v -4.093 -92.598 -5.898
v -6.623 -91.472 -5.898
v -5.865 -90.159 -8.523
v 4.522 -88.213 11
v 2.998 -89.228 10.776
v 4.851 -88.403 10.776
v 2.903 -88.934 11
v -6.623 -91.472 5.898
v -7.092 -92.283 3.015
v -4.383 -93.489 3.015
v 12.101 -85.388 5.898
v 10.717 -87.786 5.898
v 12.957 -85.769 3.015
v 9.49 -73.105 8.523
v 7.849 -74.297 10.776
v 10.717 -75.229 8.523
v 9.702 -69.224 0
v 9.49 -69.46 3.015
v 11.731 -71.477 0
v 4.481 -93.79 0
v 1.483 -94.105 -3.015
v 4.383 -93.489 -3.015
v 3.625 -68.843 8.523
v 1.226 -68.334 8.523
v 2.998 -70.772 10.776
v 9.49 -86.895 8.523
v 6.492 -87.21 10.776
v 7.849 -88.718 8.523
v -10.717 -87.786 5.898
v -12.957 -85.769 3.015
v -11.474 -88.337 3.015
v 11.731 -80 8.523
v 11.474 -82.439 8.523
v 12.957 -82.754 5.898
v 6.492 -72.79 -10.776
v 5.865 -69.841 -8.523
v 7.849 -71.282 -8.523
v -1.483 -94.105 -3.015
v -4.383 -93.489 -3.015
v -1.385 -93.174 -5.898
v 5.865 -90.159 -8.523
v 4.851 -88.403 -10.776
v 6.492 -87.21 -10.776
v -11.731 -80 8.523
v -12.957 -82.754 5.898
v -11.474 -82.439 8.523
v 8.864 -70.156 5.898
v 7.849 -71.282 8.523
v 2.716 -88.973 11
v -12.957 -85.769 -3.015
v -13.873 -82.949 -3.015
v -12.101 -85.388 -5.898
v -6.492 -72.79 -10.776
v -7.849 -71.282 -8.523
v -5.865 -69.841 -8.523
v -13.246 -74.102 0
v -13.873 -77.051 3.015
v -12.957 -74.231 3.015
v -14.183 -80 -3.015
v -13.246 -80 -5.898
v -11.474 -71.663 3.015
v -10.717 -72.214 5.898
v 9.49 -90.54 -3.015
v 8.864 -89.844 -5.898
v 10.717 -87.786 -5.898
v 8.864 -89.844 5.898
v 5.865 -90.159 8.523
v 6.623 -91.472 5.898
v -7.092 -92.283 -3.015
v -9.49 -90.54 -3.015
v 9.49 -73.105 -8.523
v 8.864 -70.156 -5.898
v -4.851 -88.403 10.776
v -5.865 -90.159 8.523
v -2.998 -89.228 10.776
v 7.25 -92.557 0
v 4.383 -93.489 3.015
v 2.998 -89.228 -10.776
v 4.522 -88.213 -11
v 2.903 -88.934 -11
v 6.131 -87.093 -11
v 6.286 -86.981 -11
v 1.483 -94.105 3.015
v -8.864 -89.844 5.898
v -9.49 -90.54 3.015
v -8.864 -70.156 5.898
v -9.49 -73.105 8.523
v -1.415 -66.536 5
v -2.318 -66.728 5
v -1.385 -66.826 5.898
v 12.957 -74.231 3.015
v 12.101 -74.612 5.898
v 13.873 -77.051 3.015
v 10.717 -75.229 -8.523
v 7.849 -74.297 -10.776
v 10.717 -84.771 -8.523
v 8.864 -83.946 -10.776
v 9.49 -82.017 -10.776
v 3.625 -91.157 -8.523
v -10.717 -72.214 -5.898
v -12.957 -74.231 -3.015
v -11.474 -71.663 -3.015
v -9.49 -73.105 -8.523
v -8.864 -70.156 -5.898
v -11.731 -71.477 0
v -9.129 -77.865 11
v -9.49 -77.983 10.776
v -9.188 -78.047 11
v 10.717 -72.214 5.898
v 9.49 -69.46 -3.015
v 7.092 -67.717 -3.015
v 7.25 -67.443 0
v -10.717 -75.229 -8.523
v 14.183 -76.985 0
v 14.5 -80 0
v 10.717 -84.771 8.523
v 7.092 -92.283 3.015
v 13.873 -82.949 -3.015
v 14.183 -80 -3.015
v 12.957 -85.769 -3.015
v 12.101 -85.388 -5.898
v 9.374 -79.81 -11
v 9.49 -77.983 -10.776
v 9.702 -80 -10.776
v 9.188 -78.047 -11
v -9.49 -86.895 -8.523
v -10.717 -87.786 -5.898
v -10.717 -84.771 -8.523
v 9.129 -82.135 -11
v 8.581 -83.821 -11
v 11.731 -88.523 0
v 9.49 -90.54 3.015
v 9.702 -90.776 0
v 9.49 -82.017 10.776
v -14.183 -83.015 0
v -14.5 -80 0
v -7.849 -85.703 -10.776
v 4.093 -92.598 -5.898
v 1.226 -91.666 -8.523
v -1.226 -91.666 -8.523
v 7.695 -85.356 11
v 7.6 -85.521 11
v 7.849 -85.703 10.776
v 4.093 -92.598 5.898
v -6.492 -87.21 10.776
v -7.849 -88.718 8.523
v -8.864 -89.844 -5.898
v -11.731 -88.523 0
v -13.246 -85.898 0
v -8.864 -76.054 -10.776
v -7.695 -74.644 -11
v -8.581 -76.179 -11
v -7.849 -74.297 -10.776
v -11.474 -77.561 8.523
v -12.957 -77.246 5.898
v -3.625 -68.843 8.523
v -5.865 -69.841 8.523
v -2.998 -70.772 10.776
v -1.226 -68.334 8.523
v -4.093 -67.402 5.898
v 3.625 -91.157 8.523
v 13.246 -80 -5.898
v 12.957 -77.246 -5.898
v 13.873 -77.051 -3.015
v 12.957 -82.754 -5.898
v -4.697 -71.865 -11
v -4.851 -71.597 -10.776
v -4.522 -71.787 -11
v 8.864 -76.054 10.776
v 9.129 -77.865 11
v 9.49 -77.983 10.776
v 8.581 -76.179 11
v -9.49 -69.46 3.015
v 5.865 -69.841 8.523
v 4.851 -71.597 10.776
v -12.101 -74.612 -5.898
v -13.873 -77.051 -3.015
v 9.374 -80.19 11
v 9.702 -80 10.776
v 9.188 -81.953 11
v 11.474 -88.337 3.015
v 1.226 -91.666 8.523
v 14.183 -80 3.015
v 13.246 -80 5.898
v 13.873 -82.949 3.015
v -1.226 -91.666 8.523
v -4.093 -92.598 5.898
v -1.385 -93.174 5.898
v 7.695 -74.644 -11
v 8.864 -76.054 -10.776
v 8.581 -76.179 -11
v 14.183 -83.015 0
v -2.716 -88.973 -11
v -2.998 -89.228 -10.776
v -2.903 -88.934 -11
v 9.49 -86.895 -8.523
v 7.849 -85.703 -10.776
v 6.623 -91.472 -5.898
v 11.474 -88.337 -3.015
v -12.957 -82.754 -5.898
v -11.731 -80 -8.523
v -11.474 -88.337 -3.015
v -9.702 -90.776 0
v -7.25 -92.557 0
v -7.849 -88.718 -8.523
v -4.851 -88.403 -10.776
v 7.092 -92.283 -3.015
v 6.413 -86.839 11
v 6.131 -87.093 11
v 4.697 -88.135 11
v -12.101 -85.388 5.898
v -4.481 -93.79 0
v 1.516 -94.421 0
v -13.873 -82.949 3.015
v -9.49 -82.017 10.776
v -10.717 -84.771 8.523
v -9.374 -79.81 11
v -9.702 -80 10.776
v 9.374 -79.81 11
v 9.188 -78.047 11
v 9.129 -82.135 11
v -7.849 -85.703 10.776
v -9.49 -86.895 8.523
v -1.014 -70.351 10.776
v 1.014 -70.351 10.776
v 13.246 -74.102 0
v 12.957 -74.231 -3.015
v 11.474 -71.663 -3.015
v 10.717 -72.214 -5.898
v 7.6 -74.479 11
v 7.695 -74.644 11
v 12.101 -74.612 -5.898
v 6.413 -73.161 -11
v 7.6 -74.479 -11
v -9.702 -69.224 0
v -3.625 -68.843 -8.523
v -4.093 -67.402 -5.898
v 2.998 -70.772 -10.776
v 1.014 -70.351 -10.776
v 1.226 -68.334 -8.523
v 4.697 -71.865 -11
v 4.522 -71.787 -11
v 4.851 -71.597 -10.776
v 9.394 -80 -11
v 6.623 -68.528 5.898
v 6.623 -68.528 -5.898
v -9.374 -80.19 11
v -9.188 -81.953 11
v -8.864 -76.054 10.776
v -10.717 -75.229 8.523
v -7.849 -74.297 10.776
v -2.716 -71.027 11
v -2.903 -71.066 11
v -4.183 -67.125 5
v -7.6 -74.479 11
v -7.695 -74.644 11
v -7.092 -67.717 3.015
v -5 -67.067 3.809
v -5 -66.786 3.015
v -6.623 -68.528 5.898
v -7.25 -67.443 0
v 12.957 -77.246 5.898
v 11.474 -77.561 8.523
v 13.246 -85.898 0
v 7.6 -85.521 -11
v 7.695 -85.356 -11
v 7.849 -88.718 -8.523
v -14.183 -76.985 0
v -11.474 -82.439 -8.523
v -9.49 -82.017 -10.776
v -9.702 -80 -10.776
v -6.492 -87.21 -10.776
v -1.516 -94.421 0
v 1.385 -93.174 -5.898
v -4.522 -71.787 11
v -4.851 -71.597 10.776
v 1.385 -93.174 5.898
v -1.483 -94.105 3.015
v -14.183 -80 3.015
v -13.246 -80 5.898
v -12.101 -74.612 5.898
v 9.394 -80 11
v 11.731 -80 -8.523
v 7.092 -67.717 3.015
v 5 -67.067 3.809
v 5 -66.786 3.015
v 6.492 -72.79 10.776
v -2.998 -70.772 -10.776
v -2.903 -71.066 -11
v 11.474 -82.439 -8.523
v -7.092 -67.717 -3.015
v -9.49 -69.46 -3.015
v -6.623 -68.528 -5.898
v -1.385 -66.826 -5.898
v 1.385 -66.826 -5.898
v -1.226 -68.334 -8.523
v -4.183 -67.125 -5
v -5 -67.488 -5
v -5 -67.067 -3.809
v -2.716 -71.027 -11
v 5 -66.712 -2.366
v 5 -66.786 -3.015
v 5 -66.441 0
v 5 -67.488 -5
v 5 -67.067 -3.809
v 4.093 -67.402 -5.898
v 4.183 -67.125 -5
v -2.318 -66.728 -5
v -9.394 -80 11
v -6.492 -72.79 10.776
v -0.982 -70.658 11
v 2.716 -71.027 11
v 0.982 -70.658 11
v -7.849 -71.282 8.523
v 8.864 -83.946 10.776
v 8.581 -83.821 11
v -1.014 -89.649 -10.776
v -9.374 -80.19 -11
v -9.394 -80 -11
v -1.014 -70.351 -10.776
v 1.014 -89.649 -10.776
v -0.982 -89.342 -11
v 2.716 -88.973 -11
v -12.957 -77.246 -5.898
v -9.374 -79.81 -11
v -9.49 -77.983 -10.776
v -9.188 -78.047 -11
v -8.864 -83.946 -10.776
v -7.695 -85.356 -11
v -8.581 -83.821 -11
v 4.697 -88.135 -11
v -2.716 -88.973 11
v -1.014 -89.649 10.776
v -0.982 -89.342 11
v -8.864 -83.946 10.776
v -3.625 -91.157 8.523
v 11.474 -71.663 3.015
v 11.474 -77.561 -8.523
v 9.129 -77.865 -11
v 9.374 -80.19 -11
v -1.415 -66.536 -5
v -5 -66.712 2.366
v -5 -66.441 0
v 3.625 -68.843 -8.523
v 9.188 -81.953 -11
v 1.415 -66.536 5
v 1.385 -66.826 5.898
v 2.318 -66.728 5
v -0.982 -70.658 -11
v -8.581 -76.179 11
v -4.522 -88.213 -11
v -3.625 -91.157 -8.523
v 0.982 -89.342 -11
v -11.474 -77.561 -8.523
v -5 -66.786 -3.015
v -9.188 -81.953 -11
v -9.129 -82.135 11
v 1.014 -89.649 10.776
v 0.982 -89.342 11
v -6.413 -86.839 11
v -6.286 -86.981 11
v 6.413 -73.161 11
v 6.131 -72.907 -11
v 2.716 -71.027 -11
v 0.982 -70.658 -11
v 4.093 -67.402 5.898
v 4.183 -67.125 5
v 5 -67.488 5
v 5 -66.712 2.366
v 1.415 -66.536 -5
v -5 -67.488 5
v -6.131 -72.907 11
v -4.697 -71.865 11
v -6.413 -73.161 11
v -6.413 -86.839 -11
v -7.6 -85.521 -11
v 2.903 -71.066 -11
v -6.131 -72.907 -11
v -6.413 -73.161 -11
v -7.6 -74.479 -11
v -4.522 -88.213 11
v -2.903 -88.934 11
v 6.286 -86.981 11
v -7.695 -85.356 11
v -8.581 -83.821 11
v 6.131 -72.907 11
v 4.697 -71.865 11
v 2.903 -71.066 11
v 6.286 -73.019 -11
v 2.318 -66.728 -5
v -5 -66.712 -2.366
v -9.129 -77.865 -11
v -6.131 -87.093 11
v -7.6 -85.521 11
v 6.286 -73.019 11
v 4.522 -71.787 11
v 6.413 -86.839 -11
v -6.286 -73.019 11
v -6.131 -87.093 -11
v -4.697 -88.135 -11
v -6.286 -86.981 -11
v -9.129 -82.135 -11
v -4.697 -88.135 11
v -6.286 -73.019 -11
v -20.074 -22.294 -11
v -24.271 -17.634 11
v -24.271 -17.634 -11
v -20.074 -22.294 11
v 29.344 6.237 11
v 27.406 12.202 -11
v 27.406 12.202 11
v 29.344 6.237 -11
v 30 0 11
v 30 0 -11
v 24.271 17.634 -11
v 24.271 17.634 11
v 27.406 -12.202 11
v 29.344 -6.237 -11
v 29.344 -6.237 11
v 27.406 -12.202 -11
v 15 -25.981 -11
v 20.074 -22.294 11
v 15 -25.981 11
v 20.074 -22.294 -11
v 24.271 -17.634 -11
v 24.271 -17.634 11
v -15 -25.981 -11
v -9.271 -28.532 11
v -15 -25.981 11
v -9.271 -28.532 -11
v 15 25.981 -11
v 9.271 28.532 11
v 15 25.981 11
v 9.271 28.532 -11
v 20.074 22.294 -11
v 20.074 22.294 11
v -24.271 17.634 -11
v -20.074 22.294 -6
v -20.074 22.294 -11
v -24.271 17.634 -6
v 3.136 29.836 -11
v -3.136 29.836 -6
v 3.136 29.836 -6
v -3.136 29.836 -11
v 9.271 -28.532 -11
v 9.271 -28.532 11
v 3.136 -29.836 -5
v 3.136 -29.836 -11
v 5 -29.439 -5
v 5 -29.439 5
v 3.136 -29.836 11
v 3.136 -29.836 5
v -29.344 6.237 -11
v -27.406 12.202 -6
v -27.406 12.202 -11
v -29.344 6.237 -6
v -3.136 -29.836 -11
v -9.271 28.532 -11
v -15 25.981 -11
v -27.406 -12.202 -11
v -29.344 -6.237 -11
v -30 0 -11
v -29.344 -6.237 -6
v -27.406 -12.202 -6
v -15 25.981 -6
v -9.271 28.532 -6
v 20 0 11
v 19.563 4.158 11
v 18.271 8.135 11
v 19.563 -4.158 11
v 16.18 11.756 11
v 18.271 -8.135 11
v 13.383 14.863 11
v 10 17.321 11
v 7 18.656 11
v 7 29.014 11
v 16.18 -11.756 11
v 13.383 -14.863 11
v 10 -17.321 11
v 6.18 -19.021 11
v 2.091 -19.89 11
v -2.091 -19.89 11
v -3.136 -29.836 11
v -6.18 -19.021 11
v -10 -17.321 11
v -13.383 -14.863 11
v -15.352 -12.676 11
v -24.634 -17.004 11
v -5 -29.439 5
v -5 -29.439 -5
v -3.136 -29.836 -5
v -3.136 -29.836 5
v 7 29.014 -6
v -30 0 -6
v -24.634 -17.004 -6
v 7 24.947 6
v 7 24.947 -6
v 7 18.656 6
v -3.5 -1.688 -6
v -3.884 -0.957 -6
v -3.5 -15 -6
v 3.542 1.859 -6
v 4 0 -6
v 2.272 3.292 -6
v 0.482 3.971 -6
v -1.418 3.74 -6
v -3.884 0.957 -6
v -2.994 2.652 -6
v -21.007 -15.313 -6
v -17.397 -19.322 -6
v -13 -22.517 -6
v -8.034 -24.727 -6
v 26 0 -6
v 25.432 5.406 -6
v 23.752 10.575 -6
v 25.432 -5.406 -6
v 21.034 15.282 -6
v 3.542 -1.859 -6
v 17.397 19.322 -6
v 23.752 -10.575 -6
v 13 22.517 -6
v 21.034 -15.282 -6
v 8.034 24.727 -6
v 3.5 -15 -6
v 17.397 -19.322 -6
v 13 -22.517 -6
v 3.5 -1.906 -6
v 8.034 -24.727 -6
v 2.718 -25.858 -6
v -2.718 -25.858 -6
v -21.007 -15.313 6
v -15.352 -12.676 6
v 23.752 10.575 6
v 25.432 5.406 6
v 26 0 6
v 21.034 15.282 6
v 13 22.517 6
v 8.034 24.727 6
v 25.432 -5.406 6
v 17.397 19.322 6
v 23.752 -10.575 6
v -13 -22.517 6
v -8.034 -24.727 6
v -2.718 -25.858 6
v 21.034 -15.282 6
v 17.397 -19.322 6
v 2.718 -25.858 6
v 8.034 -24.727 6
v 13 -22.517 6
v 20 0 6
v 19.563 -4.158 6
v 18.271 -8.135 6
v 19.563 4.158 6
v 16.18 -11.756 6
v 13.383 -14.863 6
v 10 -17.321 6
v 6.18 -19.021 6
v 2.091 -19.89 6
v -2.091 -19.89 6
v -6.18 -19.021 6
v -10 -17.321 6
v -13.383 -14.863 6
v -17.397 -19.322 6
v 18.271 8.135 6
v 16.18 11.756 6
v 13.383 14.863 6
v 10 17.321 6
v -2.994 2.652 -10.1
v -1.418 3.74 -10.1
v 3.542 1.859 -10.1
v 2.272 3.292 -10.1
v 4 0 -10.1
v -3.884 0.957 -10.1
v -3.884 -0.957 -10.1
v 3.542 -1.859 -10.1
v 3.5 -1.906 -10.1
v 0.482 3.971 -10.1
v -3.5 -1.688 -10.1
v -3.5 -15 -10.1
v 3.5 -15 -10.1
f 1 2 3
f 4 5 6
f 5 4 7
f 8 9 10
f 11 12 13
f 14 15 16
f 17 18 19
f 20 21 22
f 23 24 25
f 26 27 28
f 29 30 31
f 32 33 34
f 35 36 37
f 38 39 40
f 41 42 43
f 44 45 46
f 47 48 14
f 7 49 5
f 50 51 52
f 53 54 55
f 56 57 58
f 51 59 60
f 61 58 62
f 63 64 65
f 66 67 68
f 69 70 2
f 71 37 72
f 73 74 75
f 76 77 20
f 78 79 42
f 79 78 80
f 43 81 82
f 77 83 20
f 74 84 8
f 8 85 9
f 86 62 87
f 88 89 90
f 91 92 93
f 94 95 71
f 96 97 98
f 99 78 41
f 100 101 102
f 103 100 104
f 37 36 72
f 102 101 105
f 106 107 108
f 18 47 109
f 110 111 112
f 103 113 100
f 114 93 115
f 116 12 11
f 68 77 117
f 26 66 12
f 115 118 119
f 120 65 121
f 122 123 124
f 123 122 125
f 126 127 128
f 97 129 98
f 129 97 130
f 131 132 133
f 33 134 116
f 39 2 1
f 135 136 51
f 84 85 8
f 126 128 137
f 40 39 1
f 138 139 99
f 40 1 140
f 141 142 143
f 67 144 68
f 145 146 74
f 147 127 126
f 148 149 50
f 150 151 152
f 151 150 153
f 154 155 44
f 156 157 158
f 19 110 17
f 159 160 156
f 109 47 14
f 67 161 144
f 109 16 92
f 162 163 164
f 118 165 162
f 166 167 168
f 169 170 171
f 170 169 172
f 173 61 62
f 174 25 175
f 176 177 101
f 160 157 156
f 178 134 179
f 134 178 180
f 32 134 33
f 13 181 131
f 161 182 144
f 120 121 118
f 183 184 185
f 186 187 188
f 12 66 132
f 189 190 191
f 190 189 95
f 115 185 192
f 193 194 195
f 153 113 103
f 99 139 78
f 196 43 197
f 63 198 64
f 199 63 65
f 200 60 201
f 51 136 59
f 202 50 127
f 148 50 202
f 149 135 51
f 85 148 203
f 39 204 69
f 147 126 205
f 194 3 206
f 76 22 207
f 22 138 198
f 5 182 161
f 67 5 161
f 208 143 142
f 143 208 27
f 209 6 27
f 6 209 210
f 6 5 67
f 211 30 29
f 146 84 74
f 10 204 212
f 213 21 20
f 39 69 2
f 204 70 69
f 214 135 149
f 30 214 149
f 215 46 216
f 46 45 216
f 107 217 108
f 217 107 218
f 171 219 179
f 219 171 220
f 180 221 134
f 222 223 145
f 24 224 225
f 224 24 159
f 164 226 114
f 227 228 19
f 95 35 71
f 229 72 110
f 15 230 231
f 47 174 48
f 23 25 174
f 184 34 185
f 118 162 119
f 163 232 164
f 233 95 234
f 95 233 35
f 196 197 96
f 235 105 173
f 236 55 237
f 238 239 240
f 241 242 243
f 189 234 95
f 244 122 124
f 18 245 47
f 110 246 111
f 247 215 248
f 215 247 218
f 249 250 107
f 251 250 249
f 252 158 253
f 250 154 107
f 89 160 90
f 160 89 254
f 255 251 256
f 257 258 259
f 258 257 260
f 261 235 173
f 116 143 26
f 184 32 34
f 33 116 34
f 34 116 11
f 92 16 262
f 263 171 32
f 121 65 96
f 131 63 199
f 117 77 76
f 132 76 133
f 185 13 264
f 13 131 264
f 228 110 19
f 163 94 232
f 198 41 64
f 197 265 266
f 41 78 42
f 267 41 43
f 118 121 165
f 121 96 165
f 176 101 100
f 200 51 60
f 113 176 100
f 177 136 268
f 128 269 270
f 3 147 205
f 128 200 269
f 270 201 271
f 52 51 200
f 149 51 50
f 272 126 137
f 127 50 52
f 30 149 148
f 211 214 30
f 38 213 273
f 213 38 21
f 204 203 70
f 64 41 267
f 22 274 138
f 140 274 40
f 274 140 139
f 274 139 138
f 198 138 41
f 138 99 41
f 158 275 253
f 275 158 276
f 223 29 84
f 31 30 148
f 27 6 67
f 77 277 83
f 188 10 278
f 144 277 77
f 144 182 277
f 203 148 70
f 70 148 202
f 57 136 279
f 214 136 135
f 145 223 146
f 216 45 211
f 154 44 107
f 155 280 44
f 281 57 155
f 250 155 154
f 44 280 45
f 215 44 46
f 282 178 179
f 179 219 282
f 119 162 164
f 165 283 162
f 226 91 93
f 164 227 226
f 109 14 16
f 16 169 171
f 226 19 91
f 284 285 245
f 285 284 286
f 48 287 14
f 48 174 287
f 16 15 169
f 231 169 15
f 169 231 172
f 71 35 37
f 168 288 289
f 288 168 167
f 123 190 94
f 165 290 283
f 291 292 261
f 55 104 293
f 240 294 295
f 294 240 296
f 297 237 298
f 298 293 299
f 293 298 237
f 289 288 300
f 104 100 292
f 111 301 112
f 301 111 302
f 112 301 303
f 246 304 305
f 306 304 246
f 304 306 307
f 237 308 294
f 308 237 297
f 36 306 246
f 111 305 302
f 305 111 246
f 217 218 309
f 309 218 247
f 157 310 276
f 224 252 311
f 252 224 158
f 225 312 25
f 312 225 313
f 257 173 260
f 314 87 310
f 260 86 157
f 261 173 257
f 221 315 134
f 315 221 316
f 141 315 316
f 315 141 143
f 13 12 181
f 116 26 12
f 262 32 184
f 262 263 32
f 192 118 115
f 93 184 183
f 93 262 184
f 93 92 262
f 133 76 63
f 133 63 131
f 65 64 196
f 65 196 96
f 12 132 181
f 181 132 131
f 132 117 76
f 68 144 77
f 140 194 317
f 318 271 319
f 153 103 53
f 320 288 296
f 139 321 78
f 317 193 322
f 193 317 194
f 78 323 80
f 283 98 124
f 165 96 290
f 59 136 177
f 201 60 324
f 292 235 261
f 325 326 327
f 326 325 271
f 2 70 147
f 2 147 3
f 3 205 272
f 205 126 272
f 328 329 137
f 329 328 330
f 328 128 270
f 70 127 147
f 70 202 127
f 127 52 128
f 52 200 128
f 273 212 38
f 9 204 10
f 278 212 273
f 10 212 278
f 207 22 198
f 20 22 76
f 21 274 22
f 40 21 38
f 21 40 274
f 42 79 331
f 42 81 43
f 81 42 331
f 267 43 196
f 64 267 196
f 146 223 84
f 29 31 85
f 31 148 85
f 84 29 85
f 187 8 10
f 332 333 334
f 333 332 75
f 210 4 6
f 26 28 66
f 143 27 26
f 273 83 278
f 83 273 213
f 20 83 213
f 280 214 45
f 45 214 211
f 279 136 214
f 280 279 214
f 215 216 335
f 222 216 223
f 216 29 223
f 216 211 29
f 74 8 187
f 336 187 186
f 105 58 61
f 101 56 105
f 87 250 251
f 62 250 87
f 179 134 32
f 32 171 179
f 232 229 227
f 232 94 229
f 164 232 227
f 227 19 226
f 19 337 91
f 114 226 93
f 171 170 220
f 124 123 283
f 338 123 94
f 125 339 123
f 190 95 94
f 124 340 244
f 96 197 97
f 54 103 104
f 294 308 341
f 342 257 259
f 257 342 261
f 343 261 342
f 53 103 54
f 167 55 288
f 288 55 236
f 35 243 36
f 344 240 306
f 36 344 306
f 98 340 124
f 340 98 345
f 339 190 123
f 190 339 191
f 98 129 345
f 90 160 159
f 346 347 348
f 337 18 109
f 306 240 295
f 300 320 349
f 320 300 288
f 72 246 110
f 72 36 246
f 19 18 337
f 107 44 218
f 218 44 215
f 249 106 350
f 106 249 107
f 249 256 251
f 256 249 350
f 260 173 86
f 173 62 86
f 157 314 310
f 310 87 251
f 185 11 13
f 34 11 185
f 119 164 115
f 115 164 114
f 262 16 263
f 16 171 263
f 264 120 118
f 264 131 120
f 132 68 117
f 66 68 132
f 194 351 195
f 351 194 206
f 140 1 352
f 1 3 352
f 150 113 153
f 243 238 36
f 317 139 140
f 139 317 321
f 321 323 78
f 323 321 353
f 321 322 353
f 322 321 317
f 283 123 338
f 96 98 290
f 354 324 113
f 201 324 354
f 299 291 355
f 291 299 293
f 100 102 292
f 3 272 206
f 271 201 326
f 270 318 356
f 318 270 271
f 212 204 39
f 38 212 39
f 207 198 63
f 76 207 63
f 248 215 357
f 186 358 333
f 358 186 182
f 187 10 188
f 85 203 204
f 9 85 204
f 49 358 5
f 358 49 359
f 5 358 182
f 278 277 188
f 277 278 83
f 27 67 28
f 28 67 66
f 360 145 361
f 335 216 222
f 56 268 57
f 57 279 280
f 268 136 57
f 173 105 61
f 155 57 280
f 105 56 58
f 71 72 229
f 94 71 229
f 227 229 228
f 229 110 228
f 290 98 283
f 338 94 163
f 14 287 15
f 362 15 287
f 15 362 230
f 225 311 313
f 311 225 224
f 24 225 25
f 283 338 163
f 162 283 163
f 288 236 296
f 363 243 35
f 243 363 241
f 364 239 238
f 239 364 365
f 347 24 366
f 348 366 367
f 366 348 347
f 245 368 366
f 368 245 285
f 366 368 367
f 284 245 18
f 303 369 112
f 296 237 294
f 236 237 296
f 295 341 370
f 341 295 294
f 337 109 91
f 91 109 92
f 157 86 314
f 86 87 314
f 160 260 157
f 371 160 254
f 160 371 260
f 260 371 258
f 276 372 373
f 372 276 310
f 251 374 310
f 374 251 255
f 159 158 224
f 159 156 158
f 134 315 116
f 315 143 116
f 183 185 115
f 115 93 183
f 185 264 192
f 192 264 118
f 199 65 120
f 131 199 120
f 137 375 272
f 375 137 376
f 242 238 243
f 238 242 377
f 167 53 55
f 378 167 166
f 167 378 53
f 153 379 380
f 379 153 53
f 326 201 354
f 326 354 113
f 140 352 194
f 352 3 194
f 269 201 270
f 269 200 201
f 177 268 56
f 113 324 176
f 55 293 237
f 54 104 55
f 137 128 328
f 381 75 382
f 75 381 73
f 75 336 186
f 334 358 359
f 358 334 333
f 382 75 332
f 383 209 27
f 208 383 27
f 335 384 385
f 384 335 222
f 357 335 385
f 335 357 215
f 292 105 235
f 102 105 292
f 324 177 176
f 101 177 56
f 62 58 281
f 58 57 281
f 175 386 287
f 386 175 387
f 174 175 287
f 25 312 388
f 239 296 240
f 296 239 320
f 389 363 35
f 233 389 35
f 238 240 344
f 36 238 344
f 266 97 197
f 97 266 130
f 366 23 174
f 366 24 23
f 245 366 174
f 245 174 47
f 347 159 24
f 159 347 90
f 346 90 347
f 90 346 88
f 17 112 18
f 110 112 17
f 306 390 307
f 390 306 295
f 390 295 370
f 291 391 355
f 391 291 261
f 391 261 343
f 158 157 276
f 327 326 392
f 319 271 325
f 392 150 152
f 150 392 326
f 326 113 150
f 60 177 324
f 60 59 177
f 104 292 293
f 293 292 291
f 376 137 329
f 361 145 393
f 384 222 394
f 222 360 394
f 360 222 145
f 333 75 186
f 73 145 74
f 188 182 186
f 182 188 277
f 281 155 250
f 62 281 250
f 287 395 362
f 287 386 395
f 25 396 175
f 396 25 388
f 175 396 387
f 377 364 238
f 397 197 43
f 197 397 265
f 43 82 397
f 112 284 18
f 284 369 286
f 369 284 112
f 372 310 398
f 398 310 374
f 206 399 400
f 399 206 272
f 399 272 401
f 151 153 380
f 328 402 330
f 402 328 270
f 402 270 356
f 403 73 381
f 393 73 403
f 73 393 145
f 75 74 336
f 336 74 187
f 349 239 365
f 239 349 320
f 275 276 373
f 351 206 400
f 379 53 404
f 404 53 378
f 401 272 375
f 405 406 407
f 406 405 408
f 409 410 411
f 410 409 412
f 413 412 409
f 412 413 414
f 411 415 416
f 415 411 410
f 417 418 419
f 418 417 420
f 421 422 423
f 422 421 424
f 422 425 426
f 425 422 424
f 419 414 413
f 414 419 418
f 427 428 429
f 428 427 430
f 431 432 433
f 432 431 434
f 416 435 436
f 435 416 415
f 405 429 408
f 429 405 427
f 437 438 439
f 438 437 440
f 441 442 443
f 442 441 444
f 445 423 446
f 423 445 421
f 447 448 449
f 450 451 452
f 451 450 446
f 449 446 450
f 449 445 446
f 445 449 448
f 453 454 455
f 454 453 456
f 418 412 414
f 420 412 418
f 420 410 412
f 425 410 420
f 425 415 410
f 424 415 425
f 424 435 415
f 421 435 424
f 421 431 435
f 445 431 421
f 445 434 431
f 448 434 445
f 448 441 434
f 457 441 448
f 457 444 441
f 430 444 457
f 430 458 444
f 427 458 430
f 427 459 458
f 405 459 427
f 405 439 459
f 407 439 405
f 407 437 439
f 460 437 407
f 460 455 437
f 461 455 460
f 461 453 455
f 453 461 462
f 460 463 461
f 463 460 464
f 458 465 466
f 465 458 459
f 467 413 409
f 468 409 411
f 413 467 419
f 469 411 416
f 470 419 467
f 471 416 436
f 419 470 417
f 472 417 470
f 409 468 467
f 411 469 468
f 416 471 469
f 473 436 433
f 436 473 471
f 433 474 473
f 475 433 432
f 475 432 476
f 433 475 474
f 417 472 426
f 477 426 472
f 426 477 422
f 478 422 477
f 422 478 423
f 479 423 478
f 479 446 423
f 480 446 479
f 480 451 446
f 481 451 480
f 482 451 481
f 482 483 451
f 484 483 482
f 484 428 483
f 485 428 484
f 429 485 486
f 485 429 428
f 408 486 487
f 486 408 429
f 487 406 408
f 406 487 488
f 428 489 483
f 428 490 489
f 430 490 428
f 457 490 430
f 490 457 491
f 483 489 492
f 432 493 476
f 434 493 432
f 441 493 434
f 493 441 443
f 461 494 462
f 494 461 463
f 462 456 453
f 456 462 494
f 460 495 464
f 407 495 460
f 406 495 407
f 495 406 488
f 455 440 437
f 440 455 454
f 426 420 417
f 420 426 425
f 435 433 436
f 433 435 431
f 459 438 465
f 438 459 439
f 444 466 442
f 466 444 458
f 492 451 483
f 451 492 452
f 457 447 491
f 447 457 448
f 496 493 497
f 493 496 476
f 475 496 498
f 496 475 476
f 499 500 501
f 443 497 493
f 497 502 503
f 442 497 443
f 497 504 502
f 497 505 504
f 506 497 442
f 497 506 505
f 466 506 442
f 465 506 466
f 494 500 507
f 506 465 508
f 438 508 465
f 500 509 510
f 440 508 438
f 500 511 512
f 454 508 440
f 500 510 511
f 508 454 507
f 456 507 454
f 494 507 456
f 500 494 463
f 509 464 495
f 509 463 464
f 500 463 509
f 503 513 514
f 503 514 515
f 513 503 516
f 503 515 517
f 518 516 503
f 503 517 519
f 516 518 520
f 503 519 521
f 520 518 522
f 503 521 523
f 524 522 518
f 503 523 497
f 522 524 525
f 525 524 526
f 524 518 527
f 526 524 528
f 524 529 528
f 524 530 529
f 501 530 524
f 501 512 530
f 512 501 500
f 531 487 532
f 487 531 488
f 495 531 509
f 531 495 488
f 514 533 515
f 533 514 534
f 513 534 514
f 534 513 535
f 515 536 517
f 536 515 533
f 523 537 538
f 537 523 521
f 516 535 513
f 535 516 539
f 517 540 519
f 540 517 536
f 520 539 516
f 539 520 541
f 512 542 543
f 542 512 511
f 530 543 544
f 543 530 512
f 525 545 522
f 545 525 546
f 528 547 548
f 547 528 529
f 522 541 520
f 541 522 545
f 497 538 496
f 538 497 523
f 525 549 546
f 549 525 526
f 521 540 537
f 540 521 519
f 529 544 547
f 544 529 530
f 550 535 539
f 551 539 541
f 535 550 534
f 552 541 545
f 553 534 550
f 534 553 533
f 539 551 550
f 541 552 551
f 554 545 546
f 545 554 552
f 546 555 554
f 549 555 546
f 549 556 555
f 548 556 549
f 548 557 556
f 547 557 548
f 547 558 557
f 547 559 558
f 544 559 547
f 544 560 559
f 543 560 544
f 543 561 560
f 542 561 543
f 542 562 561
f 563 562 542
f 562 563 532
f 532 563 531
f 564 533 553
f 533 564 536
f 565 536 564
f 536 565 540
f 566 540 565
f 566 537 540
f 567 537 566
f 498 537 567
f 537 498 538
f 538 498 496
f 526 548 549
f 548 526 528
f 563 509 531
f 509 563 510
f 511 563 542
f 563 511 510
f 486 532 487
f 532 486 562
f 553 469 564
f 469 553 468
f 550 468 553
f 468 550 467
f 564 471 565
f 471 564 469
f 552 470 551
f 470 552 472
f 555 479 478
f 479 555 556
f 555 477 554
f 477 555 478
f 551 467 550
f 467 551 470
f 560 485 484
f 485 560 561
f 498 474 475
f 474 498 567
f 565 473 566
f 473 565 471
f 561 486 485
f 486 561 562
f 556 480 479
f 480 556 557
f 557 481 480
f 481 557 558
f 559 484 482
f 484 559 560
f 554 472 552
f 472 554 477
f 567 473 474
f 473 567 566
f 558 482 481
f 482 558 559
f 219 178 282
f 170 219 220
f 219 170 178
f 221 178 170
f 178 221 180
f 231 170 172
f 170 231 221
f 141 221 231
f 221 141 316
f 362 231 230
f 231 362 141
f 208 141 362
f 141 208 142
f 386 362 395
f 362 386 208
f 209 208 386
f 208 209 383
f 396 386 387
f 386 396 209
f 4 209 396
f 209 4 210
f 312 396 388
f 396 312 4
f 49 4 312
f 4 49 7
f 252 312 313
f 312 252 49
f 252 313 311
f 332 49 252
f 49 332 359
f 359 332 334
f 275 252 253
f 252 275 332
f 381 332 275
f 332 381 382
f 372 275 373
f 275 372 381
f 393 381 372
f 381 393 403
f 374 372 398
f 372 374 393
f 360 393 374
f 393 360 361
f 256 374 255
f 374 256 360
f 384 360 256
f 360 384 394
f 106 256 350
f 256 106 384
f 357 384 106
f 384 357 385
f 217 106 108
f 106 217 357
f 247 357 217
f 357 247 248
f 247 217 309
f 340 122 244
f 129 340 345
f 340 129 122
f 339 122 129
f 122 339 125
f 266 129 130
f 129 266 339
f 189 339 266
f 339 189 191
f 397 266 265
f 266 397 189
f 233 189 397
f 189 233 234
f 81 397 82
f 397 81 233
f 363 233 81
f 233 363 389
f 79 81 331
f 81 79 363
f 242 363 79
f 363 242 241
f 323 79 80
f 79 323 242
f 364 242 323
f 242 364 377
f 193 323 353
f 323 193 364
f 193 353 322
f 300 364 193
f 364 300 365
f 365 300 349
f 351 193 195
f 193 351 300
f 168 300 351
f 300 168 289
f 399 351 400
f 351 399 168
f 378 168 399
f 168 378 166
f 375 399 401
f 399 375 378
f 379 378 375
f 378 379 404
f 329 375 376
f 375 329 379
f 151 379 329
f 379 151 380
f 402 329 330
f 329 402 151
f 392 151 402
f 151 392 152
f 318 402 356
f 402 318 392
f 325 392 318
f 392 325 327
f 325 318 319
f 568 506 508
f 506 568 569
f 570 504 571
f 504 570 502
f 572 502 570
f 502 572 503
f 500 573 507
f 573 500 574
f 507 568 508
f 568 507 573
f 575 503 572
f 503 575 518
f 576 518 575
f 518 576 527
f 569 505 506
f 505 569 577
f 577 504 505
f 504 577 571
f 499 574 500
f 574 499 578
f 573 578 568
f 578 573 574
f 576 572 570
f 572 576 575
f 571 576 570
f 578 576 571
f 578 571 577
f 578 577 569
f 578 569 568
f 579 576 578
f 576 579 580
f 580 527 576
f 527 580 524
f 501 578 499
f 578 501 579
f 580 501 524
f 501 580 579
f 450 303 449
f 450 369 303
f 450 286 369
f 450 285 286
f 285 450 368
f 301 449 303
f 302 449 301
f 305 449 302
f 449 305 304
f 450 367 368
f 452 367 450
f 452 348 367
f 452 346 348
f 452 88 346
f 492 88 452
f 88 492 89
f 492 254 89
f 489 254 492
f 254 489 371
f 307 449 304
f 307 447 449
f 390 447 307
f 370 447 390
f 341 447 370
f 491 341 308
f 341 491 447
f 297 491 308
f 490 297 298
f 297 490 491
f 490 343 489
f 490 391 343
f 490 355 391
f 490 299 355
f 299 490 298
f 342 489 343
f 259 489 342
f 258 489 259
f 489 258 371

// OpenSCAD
module servo(){
	difference(){			
		union(){
			color("blue") cube([23,13,22], center=true);
			color("blue") translate([0,0,5]) cube([32,12,2], center=true);
			color("blue") translate([5.5,0,2.75]) cylinder(r=6, h=25.75, $fn=20, center=true);
			color("blue") translate([-.5,0,2.75]) cylinder(r=1, h=25.75, $fn=20, center=true);
			color("blue") translate([-1,0,2.75]) cube([5,5.6,24.5], center=true);		
			color("white") translate([5.5,0,3.65]) cylinder(r=2.35, h=29.25, $fn=20, center=true);	

        for ( hole = [14,-14] ){
                translate([hole,0,5]) cylinder(r=1.2, h=8, $fn=20, center=true);
           }				
		}
		translate([10,0,-11]) rotate([0,-30,0]) cube([8,13,4], center=true);
		
	}
}

module knee_joint(){
    translate([0,30,0]) {
        cube([30, 30, 11], true);
    }
    cylinder(11, 25, 25, true);
    
    
}


module knee() {
    difference() {

        knee_joint();
        translate([-5.5,0,-9.5]) {
            servo();
        }

    }
}

module thigh() {
    
    translate([0,-50,0]) {
        cube([10,47,10], true);
    }
    
    
    
   difference() {
       
       thigh_joint();
    
    
       translate([-8,20,4]) {
            cube([30, 30, 20], true);
        }
        
        rotate(115) {
            translate([10,20,4]) {
                cube([30, 30, 20], true);
            }
        }
        
        rotate(50) {
            translate([0,20,4]) {
                cube([30, 30, 20], true);
            }
        }
        
        
        cylinder(12, 26, 26, true);
        
        
        
        translate([0,0,10]) {
            cylinder(15, 20, 20, true); 
        }
        
        translate([0,-80,16]) {
            cube([30,30,10], true);
        }
        
        translate([0,-80,-16]) {
            cube([30,30,10], true);
        }
        
        translate([0,0,-8]) {
            cylinder(4.2, 4, 4, true);
        }
        
        translate([0,-7.5,-8]) {
            cube([7,15,4.2], true);
        }
    }
}



module thigh_joint() {
    
    
    
    translate([0,-80,0]) {
        sphere(14.5, true);
    }
           cylinder(22, 30, 30, true); 
            //translate([-10,-26,0]) {
            //    cylinder(18, 10, 10, true);
            //}
       }

thigh();
//knee();
